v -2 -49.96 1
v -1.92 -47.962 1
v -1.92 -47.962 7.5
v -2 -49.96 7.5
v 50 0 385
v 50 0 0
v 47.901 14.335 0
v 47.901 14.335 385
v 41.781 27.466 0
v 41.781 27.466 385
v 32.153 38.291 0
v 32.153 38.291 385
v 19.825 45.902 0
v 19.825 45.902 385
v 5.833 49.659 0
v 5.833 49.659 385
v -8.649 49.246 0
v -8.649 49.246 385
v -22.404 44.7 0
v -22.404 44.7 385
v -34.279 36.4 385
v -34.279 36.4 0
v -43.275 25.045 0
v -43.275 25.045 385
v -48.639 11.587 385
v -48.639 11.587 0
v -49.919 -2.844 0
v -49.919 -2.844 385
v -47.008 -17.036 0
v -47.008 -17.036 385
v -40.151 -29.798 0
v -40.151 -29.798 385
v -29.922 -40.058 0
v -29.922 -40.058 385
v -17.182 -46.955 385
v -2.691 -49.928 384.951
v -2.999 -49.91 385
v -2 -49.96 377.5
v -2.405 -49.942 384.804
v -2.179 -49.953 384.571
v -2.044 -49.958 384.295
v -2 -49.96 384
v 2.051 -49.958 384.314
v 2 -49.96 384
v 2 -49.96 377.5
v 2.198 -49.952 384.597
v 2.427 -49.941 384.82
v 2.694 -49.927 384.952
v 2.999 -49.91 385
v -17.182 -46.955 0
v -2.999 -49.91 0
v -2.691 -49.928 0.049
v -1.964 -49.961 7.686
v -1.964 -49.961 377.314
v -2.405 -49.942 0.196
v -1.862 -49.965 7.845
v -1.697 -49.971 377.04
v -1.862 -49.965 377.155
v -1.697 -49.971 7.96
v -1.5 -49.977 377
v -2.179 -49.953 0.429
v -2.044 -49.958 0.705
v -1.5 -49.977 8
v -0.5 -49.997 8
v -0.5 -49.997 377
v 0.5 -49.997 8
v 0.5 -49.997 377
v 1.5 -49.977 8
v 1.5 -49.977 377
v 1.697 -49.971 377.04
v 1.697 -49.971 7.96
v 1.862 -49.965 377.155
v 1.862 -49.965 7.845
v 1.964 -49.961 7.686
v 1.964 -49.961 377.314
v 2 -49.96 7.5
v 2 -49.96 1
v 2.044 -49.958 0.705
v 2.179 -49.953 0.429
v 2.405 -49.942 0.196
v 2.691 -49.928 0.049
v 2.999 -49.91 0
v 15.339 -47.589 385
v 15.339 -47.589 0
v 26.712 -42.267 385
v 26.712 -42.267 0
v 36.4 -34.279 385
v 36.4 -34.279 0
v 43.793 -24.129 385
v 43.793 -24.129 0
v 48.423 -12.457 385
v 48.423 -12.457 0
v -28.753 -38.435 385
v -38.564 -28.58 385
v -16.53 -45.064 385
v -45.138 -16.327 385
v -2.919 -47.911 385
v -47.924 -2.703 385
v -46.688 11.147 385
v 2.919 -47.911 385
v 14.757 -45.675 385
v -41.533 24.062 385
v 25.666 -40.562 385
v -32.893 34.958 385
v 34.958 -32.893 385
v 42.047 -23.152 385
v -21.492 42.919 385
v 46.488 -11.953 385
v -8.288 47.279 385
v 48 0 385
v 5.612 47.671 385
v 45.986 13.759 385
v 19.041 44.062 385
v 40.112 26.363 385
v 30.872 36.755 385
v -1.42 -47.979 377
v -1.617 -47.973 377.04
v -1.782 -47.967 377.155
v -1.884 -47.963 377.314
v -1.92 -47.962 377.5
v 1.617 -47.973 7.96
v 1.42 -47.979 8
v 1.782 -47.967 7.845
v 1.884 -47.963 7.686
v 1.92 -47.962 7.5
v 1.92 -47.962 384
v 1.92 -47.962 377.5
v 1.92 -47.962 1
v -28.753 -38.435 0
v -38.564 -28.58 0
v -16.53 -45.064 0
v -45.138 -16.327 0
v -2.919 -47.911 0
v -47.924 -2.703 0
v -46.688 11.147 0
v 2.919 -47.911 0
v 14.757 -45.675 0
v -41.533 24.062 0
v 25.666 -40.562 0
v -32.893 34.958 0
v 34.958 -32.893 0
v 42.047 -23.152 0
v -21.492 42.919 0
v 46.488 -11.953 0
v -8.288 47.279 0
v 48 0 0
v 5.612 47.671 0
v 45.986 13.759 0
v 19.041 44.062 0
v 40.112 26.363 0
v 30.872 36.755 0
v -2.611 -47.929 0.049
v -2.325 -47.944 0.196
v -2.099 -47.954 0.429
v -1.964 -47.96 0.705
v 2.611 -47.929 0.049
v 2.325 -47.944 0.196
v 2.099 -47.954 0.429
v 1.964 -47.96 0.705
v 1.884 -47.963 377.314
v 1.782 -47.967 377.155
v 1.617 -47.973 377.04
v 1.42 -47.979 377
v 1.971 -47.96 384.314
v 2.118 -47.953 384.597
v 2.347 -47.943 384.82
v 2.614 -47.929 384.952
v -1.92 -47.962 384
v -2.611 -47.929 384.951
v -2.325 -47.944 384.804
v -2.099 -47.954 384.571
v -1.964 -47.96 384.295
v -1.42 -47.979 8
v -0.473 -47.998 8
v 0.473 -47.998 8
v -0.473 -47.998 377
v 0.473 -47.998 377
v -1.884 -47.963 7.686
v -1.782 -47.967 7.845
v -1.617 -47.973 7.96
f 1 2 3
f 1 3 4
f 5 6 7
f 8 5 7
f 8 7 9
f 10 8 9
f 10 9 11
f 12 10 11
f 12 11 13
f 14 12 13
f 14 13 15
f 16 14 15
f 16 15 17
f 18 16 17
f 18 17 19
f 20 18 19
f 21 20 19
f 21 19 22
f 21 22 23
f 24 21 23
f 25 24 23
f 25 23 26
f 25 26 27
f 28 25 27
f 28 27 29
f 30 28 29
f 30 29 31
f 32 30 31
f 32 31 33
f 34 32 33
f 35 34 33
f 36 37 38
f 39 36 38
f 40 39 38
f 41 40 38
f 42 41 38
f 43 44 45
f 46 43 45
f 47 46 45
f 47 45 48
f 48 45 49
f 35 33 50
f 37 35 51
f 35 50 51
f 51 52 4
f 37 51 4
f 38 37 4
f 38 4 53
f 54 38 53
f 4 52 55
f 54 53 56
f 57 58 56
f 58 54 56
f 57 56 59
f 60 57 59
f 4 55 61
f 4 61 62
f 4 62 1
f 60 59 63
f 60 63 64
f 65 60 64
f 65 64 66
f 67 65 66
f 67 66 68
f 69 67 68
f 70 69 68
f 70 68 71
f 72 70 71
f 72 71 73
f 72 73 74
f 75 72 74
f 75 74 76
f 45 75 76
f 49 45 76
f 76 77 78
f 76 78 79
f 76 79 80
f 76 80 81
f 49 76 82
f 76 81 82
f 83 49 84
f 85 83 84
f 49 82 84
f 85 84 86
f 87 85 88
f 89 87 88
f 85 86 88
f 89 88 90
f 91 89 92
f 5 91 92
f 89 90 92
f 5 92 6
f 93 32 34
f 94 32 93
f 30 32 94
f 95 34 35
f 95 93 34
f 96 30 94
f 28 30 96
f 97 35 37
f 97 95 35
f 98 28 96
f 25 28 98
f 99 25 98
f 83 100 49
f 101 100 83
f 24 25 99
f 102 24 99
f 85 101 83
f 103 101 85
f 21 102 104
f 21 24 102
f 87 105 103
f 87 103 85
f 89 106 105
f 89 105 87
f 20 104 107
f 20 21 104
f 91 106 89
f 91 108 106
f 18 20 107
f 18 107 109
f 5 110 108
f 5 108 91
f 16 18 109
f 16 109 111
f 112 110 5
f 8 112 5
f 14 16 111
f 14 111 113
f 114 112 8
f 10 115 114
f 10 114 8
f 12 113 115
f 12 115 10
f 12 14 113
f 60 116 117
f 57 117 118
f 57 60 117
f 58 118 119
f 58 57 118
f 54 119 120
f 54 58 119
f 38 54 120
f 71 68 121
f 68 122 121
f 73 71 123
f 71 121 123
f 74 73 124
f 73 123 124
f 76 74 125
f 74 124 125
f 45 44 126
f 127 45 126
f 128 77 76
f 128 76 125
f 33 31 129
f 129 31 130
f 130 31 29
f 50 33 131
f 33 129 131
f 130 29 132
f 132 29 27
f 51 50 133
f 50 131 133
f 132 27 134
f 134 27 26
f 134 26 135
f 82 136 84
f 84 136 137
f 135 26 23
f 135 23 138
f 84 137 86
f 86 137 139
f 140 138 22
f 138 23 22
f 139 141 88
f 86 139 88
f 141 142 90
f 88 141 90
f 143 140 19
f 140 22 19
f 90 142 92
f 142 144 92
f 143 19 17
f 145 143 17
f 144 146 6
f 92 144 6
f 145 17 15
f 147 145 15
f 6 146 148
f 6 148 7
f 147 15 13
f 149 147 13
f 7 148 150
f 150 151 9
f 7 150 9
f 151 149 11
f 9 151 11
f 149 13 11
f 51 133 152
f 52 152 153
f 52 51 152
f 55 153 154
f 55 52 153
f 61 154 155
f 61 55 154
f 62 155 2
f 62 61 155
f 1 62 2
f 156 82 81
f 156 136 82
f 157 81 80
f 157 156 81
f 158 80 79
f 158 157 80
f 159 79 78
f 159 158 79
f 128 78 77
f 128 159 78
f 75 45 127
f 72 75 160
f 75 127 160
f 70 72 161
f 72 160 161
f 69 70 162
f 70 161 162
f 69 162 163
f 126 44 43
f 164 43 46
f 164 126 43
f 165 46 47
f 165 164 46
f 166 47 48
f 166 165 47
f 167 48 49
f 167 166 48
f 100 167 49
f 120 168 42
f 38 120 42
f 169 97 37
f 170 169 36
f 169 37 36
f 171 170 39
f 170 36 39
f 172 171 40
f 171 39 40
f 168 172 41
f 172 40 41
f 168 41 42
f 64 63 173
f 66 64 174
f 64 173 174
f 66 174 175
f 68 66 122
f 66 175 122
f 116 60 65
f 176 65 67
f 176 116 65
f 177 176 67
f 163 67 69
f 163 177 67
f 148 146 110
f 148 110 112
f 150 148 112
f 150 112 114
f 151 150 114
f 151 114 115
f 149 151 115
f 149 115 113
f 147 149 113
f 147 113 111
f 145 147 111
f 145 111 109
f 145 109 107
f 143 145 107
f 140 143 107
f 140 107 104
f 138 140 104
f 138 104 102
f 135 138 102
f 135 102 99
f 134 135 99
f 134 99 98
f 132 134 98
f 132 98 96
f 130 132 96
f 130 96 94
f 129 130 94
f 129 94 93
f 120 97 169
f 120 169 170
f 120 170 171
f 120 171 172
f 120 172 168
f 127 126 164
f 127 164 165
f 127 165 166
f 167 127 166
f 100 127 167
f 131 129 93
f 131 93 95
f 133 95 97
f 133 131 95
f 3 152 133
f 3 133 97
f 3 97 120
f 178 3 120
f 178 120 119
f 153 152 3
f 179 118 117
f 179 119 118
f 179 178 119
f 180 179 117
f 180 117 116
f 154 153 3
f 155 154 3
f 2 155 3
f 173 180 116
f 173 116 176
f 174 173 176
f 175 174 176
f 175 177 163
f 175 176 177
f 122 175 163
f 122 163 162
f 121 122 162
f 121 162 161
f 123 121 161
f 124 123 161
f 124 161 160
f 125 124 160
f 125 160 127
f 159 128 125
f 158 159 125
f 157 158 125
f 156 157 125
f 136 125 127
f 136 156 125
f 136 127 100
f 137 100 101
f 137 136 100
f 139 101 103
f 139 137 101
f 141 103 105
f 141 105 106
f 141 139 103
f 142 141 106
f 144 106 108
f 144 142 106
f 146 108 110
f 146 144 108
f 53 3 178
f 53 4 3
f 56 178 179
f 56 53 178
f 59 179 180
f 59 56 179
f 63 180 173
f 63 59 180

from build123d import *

# Parameters (mm, degrees)
SKETCH_1_R          = 50
SKETCH_1_R_2        = 48
EXTRUDE_1_DEPTH     = 385
CUT_EXTRUDE_START   = -8
CUT_EXTRUDE_1_DEPTH = 8
FILLET_1_R          = 0.5
FILLET_2_R          = 1


with BuildPart() as part:
    # Эскиз1 → Бобышка-Вытянуть1 (new body)
    with BuildSketch(Plane.XY):
        Circle(SKETCH_1_R)
        Circle(SKETCH_1_R_2, mode=Mode.SUBTRACT)
    extrude(amount=EXTRUDE_1_DEPTH)

    # Эскиз3 → Вырез-Вытянуть1 (cut)
    with BuildSketch(Plane.XY.offset(385).offset(CUT_EXTRUDE_START)):
        with BuildLine():
            Line((-1.92, -47.961584628), (-2, -49.959983987))
            ThreePointArc((-2, -49.959983987), (0, -50), (2, -49.959983987))
            Line((2, -49.959983987), (1.92, -47.961584628))
            ThreePointArc((1.92, -47.961584628), (0, -48), (-1.92, -47.961584628))
        make_face()
    cut_extrude_1 = extrude(amount=CUT_EXTRUDE_1_DEPTH, mode=Mode.SUBTRACT)

    # Зеркальное отражение3: Вырез-Вытянуть1 across plane
    add(cut_extrude_1.mirror(Plane.XY.offset(192.5)), mode=Mode.SUBTRACT)

    # Скругление1
    fillet_1_edges = [part.edges().sort_by_distance(p)[0] for p in [
        (-1.96, -48.960784307, 377),
        (1.96, -48.960784307, 377),
        (1.96, -48.960784307, 8),
        (-1.96, -48.960784307, 8),
    ]]
    fillet(fillet_1_edges, radius=FILLET_1_R)

    # Скругление2
    fillet_2_edges = [part.edges().sort_by_distance(p)[0] for p in [
        (1.96, -48.960784307, 385),
        (-1.96, -48.960784307, 385),
        (1.96, -48.960784307, 0),
        (-1.96, -48.960784307, 0),
    ]]
    fillet(fillet_2_edges, radius=FILLET_2_R)


solid = part.part
